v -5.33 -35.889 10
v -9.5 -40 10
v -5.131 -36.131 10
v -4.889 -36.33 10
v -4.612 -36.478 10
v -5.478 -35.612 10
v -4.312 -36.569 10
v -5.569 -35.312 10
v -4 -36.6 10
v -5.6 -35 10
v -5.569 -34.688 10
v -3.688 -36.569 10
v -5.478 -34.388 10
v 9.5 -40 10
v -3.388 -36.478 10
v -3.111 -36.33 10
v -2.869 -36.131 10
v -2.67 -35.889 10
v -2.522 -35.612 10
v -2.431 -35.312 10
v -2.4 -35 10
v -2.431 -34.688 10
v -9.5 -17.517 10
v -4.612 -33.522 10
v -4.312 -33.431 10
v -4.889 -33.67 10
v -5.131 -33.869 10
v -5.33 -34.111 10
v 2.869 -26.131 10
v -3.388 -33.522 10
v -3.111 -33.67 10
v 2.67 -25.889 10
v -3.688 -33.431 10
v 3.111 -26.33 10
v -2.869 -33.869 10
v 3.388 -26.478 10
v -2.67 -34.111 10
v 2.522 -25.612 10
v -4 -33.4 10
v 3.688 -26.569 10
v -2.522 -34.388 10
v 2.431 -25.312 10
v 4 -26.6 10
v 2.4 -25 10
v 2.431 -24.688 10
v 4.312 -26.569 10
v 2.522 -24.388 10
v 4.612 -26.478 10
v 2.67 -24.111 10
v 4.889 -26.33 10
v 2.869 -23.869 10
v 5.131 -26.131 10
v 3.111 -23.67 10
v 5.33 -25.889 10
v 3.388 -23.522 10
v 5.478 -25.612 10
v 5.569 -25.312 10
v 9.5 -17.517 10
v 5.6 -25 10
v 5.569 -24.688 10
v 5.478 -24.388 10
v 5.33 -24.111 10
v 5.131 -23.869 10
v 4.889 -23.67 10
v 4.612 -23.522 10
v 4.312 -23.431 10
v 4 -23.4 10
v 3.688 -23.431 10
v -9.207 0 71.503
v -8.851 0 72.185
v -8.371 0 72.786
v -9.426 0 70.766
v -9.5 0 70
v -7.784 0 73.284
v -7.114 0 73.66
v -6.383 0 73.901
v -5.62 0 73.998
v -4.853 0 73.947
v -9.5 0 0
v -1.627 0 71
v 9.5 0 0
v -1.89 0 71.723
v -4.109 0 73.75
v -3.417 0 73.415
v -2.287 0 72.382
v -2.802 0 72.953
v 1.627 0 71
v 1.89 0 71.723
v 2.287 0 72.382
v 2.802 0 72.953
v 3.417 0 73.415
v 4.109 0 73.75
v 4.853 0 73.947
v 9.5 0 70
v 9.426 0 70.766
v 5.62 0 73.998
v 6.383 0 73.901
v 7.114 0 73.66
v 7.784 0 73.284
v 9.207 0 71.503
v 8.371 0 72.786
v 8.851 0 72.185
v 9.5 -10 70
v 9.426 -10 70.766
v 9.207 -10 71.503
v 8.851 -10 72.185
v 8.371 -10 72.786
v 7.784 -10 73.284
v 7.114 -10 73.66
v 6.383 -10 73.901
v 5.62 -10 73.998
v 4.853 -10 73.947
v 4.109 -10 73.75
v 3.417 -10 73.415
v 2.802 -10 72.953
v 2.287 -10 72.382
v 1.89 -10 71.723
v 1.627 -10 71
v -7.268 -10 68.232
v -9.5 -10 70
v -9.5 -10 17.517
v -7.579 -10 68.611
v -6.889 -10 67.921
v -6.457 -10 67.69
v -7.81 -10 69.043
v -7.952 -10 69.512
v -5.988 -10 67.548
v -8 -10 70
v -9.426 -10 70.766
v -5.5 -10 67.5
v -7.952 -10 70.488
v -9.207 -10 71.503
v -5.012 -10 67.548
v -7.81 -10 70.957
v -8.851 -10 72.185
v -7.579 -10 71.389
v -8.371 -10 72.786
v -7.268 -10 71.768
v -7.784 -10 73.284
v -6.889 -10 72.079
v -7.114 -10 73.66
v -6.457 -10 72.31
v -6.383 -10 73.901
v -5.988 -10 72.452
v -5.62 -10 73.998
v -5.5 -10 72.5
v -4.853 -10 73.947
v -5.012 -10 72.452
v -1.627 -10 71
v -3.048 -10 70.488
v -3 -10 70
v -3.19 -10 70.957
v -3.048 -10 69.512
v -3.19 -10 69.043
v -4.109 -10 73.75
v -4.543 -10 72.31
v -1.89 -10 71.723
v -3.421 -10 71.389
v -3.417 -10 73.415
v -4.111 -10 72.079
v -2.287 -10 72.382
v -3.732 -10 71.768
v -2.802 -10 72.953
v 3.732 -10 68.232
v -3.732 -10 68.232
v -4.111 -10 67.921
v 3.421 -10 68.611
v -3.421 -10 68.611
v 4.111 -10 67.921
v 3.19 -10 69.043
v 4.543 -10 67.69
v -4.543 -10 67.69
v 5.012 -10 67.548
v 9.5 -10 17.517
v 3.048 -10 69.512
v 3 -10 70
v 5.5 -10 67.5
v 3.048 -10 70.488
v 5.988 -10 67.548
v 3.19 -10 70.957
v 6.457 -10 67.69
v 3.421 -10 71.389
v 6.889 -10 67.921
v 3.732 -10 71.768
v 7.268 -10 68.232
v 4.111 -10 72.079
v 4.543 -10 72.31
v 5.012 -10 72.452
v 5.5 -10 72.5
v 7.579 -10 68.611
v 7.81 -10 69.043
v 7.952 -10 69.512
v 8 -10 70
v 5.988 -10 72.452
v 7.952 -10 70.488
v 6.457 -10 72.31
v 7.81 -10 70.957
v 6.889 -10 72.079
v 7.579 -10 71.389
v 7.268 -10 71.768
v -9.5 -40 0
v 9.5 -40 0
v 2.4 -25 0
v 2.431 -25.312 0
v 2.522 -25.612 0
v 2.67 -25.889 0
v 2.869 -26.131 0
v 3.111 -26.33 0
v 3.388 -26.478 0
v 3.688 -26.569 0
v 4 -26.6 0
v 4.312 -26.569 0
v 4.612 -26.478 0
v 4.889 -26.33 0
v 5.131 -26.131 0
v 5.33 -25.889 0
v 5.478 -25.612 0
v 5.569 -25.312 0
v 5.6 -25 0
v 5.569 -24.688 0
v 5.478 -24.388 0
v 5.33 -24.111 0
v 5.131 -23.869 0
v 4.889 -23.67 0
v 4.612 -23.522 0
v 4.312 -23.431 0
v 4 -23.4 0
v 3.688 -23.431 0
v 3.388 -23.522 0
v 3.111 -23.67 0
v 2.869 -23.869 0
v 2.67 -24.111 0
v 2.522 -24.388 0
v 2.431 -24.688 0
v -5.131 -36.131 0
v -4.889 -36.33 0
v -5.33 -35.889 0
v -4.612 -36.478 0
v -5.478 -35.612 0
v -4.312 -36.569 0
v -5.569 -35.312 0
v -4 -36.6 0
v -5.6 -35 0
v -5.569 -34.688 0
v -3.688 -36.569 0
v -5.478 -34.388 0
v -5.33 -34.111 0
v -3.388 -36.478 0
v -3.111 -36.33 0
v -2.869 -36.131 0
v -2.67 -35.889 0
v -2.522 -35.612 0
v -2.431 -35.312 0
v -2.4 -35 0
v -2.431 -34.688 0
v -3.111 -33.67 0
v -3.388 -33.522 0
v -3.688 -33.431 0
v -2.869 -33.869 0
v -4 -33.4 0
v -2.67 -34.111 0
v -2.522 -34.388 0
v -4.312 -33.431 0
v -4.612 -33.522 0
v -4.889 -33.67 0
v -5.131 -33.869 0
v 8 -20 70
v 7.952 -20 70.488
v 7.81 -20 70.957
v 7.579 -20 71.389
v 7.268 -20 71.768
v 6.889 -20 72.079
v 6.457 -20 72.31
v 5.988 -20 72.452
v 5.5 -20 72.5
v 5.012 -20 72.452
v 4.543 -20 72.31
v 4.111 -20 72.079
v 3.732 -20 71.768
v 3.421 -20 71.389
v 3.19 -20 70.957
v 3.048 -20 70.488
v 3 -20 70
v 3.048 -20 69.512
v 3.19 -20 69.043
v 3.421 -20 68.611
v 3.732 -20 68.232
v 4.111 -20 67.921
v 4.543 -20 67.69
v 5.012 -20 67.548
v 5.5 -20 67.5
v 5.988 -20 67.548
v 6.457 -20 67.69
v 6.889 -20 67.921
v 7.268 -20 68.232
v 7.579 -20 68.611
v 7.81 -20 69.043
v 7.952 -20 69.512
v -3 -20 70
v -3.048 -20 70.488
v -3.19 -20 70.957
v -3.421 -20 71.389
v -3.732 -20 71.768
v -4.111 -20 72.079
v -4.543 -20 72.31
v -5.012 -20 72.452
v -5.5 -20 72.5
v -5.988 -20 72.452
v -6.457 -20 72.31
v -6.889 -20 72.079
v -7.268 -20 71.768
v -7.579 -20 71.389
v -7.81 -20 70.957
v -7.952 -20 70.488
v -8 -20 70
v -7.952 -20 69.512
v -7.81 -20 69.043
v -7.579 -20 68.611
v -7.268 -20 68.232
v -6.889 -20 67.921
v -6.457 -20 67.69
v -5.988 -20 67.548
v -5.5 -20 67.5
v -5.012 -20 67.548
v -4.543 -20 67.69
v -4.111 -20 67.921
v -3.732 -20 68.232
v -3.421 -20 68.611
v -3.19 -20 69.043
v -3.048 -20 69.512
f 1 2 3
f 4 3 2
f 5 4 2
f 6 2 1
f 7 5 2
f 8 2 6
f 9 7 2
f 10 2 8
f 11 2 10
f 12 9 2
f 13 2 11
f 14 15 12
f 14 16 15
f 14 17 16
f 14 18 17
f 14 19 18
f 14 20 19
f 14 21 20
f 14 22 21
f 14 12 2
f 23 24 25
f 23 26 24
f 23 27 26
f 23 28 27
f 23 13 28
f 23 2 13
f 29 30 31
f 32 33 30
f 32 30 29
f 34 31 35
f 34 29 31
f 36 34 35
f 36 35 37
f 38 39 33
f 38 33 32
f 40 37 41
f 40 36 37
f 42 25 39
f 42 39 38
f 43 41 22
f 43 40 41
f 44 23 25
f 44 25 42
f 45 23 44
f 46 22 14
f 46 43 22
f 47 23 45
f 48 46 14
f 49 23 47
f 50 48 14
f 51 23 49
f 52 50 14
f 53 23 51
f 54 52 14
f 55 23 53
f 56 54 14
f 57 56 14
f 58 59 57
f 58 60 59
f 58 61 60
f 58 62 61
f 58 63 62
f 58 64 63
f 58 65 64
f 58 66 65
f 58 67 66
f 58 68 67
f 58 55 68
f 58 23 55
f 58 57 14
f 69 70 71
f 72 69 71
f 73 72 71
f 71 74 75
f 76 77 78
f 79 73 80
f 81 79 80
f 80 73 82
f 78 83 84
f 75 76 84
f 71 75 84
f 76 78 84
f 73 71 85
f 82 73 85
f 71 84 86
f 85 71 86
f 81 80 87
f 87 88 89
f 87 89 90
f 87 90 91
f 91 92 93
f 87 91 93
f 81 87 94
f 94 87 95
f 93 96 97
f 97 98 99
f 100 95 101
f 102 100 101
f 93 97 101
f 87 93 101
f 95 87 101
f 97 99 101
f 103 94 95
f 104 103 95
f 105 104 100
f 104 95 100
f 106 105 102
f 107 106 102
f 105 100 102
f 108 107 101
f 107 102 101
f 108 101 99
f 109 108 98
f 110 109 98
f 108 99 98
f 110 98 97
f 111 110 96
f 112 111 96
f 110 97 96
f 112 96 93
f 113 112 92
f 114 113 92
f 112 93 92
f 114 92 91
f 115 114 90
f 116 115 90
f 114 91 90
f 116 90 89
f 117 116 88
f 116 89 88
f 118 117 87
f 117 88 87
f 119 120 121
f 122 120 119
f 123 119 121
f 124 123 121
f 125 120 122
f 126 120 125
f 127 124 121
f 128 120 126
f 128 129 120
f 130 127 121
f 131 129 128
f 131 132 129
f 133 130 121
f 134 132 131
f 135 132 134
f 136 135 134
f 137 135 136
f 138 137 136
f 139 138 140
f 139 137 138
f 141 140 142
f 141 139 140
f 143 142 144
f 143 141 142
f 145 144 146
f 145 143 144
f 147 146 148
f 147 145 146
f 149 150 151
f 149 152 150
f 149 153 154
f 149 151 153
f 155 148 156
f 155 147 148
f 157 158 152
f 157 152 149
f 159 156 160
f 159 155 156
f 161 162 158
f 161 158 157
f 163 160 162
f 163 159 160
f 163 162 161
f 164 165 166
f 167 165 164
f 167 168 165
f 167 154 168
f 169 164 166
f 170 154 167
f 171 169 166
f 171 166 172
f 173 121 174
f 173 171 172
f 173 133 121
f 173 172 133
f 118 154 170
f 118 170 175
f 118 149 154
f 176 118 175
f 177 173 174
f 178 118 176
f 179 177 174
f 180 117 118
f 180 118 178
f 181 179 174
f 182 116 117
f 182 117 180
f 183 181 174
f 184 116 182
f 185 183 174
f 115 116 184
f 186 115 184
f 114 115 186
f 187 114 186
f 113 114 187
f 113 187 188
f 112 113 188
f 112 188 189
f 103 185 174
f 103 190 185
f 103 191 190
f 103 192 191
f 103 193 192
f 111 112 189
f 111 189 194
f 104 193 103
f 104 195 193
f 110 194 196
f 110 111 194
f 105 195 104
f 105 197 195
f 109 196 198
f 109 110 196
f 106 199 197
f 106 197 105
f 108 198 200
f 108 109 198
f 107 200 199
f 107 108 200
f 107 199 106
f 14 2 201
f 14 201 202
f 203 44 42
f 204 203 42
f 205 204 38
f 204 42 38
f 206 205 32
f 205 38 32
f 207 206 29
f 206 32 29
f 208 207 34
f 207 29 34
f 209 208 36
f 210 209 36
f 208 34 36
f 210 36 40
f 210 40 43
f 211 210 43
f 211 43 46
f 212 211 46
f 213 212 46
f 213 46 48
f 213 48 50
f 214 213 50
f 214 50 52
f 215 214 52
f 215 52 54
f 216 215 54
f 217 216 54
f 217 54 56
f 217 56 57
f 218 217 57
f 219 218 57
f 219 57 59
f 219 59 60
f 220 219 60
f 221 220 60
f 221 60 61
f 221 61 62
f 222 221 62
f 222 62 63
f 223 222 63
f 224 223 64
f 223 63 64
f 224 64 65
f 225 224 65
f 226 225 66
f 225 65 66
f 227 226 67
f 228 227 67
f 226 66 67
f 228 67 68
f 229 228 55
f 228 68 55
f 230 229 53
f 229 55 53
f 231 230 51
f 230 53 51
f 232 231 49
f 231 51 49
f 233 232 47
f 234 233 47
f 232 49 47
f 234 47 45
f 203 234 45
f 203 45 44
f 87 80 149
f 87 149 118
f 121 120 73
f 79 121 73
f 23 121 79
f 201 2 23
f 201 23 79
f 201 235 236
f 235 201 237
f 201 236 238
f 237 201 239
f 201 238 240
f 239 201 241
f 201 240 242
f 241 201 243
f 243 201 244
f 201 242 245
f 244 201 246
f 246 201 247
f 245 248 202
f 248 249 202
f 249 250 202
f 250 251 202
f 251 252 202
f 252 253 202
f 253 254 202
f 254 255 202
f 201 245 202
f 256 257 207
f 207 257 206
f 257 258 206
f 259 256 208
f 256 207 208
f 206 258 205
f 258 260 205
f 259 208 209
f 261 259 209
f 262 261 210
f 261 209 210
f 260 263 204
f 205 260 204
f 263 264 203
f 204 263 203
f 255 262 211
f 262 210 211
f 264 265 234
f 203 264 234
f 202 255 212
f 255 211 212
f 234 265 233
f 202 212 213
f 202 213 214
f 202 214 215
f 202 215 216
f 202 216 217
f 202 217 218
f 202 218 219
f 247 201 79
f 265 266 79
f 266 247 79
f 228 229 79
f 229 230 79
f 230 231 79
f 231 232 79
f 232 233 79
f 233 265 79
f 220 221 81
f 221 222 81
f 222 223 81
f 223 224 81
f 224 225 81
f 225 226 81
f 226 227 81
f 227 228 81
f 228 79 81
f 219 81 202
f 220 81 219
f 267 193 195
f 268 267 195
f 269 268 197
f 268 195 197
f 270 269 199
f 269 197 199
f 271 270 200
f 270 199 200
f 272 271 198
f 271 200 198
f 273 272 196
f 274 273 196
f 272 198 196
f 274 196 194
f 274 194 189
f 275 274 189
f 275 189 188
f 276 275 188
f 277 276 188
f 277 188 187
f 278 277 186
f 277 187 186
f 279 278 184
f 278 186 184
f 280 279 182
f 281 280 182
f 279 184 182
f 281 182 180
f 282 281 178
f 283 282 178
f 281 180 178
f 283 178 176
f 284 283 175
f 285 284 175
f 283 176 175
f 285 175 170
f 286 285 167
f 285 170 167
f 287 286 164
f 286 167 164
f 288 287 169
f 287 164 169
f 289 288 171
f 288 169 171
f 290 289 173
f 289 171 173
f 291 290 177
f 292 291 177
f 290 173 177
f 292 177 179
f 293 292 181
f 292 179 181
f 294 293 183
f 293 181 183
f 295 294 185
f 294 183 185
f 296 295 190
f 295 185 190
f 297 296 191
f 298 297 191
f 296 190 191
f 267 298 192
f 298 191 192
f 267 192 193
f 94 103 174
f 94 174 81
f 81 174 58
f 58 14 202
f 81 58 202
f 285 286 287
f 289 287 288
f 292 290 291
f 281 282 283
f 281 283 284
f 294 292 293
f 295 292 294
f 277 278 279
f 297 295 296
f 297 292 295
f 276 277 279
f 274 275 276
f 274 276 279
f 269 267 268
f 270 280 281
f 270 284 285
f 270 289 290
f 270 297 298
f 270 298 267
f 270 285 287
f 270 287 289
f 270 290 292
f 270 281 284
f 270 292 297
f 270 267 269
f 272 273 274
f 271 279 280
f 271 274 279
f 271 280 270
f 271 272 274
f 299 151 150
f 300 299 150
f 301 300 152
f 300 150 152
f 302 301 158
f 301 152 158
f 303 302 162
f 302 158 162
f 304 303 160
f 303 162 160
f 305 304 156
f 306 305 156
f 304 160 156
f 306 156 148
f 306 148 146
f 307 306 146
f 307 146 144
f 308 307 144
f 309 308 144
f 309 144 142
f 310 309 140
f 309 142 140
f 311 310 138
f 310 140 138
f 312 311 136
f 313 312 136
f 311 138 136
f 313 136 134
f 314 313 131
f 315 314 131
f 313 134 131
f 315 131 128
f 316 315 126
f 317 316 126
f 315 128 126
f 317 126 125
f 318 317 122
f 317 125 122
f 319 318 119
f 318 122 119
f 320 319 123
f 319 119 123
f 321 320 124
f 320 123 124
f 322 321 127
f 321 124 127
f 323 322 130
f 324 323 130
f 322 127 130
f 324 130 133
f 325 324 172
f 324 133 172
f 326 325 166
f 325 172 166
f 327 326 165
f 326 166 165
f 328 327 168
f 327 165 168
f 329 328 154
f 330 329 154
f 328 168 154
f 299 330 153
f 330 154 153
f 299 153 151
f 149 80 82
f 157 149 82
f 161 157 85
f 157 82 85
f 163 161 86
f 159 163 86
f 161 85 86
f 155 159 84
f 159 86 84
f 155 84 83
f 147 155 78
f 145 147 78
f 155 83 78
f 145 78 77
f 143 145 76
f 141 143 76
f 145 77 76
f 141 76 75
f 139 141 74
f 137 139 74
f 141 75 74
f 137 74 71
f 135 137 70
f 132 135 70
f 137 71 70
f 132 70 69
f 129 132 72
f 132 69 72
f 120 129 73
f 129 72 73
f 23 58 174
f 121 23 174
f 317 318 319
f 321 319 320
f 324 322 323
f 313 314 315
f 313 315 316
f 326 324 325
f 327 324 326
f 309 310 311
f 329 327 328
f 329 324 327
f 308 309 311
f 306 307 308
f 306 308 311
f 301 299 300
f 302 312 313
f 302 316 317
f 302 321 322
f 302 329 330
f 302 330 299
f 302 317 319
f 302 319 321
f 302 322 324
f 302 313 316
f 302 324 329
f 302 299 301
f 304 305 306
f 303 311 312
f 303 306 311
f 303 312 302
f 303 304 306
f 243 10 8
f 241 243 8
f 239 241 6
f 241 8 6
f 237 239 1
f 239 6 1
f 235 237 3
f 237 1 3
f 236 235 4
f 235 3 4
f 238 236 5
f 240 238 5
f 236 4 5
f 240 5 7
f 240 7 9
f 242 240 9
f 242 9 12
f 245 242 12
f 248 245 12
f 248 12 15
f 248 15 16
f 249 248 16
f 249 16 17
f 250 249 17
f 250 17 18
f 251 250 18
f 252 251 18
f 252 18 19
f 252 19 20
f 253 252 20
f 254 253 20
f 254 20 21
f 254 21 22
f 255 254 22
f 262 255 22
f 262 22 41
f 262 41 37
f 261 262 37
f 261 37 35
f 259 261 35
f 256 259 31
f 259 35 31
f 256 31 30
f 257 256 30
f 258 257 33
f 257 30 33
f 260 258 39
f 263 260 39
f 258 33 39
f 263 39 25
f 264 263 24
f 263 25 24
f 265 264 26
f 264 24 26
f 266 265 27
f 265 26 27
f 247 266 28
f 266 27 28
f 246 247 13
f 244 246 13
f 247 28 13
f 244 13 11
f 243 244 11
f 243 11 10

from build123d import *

# Parameters (mm, degrees)
PAD003_DEPTH    = 10
SKETCH012_W     = 19
SKETCH012_H     = 10
PAD004_DEPTH    = 30
SKETCH013_R     = 1.6
POCKET006_DEPTH = 10.001
PAD005_DEPTH    = 19
SKETCH015_R     = 2.5
PAD006_DEPTH    = 10


with BuildPart() as part:
    # Sketch010 → Pad003 (new body)
    with BuildSketch(Plane.XZ):
        with BuildLine():
            Line((9.5, 0), (9.5, 70))
            ThreePointArc((9.5, 70), (6.004017, 73.968119), (1.627017, 71))
            Line((-1.627017, 71), (1.627017, 71))
            ThreePointArc((-1.627017, 71), (-6.004017, 73.968119), (-9.5, 70))
            Line((-9.5, 70), (-9.5, 0))
            Line((-9.5, 0), (9.5, 0))
        make_face()
    extrude(amount=PAD003_DEPTH)

    # Sketch012 (on Face8 of Pad003) → Pad004 (join)
    with BuildSketch(Plane.XZ.offset(10)):
        with Locations((0, 5)):
            Rectangle(SKETCH012_W, SKETCH012_H)
    extrude(amount=PAD004_DEPTH)

    # Sketch013 (on Face6 of Pad004) → Pocket006 (cut, through all)
    with BuildSketch(Plane(origin=(0, 0, 10), x_dir=(-1, 0, 0), z_dir=(0, 0, 1))):
        with Locations((-4, 25)):
            Circle(SKETCH013_R)
        with Locations((4, 35)):
            Circle(SKETCH013_R)
    extrude(amount=-POCKET006_DEPTH, mode=Mode.SUBTRACT)

    # Sketch014 (on Face10 of Pocket006) → Pad005 (join)
    with BuildSketch(Plane(origin=(9.5, 0, 0), x_dir=(0, 0, 1), z_dir=(1, 0, 0))):
        Polygon((10, 17.517339), (17.517341, 10), (10, 10), align=None)
    extrude(amount=-PAD005_DEPTH)

    # Sketch015 (on Face4 of Pad005) → Pad006 (join)
    with BuildSketch(Plane.XZ.offset(10)):
        with Locations((-5.5, 70)):
            Circle(SKETCH015_R)
        with Locations((5.5, 70)):
            Circle(SKETCH015_R)
    extrude(amount=PAD006_DEPTH)


solid = part.part
